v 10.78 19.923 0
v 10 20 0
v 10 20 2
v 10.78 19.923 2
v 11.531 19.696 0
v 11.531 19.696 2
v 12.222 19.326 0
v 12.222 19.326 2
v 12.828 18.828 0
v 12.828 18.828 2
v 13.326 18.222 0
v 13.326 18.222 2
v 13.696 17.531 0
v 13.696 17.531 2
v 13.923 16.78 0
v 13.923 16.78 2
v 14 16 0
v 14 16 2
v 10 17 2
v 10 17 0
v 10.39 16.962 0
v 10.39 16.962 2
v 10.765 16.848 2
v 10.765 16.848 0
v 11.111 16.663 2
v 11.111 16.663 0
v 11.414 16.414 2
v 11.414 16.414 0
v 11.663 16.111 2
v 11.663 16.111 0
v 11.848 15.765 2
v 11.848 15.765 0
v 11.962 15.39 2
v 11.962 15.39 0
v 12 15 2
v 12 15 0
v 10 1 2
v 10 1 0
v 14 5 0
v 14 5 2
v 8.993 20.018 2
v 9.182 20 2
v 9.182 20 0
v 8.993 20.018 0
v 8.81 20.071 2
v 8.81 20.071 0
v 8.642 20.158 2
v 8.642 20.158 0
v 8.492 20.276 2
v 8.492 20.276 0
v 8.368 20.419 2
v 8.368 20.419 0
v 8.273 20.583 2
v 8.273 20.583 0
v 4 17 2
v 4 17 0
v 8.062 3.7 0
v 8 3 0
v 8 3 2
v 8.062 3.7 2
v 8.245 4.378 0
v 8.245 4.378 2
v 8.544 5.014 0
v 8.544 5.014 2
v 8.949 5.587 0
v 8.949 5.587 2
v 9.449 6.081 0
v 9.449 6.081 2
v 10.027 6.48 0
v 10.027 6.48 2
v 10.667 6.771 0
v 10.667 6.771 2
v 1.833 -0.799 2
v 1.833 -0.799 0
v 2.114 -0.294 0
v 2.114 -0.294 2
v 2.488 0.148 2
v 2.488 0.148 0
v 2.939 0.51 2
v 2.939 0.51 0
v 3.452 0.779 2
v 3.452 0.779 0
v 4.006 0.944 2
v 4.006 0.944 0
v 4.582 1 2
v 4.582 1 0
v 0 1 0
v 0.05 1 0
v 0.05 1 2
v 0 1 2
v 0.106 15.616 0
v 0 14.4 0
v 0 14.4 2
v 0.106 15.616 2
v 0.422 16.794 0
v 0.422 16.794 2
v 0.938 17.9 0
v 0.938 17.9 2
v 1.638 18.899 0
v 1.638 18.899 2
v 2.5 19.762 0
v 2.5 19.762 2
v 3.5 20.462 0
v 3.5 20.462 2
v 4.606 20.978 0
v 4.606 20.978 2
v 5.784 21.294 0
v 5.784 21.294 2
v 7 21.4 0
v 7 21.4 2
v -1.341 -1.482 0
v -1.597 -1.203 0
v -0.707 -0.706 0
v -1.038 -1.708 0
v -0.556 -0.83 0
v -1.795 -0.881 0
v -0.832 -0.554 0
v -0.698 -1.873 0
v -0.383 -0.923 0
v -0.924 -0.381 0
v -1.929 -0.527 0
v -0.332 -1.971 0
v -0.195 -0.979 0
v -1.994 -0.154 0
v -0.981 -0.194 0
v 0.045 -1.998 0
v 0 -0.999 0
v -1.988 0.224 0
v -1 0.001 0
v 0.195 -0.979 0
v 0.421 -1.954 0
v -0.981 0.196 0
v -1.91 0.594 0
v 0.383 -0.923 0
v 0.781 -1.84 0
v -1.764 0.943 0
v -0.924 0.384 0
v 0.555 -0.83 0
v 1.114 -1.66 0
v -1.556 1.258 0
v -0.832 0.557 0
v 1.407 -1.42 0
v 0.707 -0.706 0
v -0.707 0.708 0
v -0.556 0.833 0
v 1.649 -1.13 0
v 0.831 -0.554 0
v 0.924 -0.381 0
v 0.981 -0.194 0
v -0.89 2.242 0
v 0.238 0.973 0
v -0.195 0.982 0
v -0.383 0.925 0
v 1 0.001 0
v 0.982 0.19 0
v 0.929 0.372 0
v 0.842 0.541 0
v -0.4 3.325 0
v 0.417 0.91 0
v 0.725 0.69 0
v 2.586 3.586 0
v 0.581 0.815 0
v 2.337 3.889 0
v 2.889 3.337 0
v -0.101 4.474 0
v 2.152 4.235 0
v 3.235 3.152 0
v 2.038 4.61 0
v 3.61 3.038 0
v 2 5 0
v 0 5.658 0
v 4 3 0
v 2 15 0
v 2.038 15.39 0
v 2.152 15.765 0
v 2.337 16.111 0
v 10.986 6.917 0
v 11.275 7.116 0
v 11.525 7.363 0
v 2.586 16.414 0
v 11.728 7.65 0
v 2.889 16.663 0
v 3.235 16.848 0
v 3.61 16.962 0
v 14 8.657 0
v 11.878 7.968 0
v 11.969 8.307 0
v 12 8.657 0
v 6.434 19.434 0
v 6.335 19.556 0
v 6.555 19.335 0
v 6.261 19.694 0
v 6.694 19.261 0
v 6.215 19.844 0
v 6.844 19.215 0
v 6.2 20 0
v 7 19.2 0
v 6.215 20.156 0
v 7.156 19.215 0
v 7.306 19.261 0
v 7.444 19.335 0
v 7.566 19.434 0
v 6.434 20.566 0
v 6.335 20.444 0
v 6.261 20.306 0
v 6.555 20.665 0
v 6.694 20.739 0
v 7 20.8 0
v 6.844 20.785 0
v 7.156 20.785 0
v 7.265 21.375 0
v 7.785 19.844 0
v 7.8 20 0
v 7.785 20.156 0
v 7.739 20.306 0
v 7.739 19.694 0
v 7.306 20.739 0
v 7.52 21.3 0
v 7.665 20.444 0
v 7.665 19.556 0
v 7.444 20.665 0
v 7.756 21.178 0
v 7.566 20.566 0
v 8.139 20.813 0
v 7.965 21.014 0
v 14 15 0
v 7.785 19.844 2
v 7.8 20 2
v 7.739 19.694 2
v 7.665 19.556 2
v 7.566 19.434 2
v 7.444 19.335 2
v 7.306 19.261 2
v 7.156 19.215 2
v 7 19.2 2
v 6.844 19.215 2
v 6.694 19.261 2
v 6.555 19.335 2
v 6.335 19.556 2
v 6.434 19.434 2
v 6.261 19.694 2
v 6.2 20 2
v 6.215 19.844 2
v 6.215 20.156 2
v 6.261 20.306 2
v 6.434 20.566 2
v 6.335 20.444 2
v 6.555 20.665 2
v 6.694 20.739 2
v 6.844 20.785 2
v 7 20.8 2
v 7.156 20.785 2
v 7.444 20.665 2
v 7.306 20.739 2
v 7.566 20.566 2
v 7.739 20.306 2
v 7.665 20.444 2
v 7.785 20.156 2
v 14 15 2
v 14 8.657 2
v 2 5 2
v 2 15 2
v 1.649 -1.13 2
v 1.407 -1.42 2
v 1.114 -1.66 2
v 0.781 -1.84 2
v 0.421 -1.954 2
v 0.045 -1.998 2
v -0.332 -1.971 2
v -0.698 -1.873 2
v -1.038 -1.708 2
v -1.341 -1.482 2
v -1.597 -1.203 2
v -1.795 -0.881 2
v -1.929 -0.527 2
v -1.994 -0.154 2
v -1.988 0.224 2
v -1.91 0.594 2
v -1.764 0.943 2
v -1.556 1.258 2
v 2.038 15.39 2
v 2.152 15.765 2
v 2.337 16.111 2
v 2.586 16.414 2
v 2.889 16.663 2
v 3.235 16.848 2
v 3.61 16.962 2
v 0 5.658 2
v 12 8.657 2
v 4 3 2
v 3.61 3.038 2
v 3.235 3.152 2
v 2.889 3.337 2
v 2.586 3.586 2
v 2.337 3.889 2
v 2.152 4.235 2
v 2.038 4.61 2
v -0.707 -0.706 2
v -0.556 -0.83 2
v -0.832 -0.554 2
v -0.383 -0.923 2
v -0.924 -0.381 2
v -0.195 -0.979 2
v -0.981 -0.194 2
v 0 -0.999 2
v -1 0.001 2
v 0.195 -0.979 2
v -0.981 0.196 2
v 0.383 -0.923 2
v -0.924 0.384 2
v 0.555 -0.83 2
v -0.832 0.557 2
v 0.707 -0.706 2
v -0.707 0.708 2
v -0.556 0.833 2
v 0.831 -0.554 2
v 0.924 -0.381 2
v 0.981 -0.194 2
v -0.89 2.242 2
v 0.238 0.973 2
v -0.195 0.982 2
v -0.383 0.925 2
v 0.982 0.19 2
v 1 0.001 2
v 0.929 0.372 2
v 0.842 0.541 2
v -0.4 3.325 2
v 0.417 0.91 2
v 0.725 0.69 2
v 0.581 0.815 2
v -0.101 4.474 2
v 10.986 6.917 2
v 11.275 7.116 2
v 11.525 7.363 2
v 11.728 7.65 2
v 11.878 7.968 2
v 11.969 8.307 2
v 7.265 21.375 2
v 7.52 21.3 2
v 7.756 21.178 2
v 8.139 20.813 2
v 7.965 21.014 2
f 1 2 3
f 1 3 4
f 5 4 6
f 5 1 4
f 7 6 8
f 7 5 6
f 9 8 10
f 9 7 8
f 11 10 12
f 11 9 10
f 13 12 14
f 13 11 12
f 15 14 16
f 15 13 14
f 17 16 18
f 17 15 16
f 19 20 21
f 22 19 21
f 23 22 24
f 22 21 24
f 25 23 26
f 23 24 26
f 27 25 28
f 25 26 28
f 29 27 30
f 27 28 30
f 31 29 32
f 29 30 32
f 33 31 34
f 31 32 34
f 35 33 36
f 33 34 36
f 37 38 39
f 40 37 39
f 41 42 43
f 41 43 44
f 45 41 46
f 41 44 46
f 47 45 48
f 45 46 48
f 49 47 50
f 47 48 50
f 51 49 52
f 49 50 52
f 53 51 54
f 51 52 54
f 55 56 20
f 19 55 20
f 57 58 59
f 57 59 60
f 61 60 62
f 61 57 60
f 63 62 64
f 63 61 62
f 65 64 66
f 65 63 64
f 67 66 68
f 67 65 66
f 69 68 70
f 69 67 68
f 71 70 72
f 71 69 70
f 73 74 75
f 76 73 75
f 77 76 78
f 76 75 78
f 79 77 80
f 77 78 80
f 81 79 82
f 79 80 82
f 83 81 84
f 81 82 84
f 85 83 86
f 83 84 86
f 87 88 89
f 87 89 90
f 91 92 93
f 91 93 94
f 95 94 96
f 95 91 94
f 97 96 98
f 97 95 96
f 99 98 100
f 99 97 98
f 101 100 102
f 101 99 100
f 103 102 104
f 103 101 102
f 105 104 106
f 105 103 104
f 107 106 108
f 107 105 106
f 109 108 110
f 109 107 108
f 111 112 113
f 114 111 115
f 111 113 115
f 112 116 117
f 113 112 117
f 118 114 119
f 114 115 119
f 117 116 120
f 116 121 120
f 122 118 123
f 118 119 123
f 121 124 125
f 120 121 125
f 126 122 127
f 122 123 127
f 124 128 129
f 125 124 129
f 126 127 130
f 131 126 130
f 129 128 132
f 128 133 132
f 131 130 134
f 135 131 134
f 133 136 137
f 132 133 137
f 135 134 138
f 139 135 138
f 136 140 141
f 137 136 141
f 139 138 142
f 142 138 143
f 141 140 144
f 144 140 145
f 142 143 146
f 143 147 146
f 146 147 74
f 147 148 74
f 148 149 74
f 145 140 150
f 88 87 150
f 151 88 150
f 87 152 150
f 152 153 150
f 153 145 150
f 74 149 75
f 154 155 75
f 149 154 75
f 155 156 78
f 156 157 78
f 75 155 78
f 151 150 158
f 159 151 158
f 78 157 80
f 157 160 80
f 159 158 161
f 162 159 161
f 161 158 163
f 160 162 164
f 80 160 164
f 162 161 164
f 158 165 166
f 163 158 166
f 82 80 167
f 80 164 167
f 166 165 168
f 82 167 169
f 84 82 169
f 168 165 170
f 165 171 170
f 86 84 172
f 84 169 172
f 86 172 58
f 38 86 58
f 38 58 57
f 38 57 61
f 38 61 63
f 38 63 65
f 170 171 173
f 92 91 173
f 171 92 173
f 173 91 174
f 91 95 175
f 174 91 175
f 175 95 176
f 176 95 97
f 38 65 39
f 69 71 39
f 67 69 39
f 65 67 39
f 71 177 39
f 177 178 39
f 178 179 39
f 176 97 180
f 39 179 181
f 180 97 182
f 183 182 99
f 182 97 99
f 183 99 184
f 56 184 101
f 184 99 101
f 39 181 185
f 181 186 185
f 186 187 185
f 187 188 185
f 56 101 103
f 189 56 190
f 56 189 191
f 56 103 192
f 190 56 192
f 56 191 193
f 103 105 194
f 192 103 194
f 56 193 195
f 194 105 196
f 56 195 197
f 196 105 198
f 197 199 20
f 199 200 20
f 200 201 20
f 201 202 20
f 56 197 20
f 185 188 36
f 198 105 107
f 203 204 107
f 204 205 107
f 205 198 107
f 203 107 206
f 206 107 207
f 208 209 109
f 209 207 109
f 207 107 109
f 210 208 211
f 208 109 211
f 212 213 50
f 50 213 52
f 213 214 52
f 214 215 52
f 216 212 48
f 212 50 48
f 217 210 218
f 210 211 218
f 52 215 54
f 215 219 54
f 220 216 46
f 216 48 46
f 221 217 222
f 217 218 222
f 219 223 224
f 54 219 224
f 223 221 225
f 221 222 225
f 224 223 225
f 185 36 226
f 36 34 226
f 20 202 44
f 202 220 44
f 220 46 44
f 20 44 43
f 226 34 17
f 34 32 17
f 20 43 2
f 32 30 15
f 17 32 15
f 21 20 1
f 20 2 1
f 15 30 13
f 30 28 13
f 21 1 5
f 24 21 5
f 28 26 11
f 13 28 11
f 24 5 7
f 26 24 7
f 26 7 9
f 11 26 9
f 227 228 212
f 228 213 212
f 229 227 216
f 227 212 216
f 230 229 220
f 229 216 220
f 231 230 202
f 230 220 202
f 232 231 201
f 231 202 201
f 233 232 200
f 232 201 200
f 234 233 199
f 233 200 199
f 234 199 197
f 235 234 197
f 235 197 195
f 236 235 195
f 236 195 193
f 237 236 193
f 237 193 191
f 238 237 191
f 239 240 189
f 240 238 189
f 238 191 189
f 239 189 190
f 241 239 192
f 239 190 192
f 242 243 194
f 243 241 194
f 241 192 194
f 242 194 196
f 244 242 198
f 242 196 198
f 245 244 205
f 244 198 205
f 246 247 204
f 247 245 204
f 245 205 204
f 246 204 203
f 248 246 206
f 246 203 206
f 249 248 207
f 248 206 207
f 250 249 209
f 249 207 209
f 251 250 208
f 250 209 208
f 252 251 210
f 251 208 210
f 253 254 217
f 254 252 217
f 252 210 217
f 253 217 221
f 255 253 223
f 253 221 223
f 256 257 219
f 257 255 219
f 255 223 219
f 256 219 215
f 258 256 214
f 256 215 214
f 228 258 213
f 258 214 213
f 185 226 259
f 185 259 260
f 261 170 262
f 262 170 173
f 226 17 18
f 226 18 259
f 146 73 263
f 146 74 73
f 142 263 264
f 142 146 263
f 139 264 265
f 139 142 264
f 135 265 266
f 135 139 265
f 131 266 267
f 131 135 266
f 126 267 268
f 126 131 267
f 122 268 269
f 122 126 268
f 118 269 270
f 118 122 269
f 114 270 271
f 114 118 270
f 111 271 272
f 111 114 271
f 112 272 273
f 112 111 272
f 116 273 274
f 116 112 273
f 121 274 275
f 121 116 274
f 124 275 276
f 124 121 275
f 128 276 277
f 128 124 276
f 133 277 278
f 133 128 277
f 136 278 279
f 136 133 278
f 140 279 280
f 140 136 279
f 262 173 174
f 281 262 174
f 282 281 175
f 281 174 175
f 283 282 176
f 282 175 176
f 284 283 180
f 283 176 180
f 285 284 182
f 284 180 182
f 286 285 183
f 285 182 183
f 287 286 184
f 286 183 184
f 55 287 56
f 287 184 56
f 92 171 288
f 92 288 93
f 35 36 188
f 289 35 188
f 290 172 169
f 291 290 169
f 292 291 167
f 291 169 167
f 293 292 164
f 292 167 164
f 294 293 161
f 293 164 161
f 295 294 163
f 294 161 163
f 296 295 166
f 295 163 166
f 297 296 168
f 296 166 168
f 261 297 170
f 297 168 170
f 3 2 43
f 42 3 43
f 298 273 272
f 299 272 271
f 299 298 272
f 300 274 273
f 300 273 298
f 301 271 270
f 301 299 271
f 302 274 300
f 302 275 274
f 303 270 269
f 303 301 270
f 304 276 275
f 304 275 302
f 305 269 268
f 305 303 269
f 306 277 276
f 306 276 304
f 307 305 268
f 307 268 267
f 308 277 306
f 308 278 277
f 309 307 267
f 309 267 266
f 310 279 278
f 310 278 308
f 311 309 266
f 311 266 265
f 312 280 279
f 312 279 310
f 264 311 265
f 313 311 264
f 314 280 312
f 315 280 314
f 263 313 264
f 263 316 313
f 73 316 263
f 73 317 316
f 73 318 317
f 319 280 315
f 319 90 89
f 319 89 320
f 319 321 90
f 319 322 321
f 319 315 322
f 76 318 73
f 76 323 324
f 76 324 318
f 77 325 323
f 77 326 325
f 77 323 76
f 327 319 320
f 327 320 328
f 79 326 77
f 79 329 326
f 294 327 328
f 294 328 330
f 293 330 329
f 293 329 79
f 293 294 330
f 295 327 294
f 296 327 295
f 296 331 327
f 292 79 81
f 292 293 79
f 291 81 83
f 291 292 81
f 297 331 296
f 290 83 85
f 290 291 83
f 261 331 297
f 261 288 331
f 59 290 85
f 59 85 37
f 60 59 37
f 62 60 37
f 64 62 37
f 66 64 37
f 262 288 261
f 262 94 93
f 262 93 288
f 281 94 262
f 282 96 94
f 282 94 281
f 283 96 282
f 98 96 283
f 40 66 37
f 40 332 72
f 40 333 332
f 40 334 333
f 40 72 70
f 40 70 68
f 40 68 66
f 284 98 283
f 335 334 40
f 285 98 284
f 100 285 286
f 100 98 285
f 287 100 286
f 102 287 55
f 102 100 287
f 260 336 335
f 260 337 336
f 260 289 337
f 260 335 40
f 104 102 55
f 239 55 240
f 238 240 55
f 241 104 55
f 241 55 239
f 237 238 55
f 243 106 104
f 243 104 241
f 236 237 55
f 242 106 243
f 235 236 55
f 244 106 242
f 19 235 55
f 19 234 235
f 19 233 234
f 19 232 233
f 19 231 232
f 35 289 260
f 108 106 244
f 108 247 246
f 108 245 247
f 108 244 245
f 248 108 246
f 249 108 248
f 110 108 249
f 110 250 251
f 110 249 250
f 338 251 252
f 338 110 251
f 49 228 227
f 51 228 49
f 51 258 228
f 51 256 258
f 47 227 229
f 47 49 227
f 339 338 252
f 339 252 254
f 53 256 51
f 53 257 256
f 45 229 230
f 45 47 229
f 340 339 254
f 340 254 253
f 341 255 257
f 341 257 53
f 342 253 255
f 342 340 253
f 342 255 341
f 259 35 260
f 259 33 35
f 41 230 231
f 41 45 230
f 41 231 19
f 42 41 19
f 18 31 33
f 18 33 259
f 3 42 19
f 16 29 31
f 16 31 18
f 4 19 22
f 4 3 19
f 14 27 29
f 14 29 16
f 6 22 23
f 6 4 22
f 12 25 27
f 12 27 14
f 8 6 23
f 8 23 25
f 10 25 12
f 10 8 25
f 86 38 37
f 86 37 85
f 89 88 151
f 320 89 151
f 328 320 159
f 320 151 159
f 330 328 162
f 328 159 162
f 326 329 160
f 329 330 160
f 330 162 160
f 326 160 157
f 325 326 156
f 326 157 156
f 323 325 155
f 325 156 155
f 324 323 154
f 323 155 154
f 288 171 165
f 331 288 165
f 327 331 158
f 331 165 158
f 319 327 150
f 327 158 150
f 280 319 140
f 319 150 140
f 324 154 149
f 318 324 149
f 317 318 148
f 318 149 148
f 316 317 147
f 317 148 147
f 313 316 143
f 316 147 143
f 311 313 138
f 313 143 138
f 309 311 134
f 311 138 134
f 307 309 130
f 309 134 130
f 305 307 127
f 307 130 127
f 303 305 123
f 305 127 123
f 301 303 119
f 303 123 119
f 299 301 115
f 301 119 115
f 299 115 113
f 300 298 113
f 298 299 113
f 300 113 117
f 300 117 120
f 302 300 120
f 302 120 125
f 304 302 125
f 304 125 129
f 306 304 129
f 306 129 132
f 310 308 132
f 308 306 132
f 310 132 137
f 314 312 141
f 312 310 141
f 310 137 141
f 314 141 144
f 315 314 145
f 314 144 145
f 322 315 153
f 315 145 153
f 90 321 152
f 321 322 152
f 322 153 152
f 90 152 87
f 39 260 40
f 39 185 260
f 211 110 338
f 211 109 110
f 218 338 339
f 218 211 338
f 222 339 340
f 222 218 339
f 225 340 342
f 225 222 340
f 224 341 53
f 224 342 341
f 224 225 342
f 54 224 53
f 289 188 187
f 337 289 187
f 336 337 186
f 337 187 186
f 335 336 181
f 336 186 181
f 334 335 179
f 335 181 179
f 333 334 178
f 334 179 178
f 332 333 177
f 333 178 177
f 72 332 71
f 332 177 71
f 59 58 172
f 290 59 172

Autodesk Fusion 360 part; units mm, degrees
sketch "Sketch1" plane through (0, 0, 0) normal (0, 0, 1) x (1, 0, 0)
  circle A0 centre (-0.0001, 0.0013) radius 1
  line L0 (14, 16) -> (14, 5)
  line L1 (4, 17) -> (10, 17)
  line L2 (12, 15) -> (12, 8.6569)
  line L3 (8, 3) -> (4, 3)
  line L4 (2, 5) -> (2, 15)
  circle A1 centre (6.9999, 20) radius 0.8
  line L5 (10, 1) -> (14, 5)
  line L6 (12, 1) -> (15.2632, 1) construction
  arc A2 (10.6667, 6.7712) -> (8, 3) centre (12, 3) ccw
  arc A3 (4, 17) -> (2, 15) centre (4, 15) ccw
  arc A4 (12, 15) -> (10, 17) centre (10, 15) ccw
  arc A5 (2, 5) -> (4, 3) centre (4, 5) ccw
  arc A6 (10.6667, 6.7712) -> (12, 8.6569) centre (10, 8.6569) ccw
  line L7 (14, 15) -> (14, 8.6569)
  line L8 (10, 1) -> (4, 1)
  line L9 (0, 5) -> (0, 15)
  arc A7 (-1.5556, 1.2584) -> (1.8327, -0.7992) centre (-0.0001, 0.0013) ccw
  line L10 (0, 1) -> (0, 1.0013)
  line L11 (0, 5.6582) -> (0, 14.4)
  line L12 (10, 1) -> (4.582, 1)
  line L13 (0.0503, 1) -> (0, 1)
  arc A8 (-1.5556, 1.2584) -> (0, 5.6582) centre (-7, 5.6582) ccw
  arc A9 (4.582, 1) -> (1.8327, -0.7992) centre (4.582, -2) ccw
  arc A10 (6.9999, 21.4) -> (0, 14.4) centre (7, 14.4) ccw
  arc A11 (7, 21.4) -> (6.9999, 21.4) centre (6.9999, 20) ccw
  line L14 (10, 20) -> (9.1816, 20)
  arc A12 (8.2726, 20.5833) -> (6.9999, 21.4) centre (6.9999, 20) ccw
  arc A13 (8.2726, 20.5833) -> (9.1816, 20) centre (9.1816, 21) ccw
  arc A14 (14, 16) -> (10, 20) centre (10, 16) ccw
  dimension "d1" = 4
  dimension "d2" = 2
  dimension "d3" = 1.6
  dimension "d4" = 2.8
  dimension "d5" = 14
  dimension "d8" = 20
  dimension "d10" = 17
  dimension "d11" = 15
  dimension "d12" = 3
  dimension "d13" = 8
  dimension "d14" = 2
  dimension "d15" = 2
  dimension "d16" = 2
  dimension "d17" = 2
  dimension "d19" = 7
  dimension "d20" = 3
  dimension "d21" = 7
  dimension "d23" = 1
  dimension "d24" = 4
extrude "Extrude1" add sketch "Sketch1" along normal blind 2
